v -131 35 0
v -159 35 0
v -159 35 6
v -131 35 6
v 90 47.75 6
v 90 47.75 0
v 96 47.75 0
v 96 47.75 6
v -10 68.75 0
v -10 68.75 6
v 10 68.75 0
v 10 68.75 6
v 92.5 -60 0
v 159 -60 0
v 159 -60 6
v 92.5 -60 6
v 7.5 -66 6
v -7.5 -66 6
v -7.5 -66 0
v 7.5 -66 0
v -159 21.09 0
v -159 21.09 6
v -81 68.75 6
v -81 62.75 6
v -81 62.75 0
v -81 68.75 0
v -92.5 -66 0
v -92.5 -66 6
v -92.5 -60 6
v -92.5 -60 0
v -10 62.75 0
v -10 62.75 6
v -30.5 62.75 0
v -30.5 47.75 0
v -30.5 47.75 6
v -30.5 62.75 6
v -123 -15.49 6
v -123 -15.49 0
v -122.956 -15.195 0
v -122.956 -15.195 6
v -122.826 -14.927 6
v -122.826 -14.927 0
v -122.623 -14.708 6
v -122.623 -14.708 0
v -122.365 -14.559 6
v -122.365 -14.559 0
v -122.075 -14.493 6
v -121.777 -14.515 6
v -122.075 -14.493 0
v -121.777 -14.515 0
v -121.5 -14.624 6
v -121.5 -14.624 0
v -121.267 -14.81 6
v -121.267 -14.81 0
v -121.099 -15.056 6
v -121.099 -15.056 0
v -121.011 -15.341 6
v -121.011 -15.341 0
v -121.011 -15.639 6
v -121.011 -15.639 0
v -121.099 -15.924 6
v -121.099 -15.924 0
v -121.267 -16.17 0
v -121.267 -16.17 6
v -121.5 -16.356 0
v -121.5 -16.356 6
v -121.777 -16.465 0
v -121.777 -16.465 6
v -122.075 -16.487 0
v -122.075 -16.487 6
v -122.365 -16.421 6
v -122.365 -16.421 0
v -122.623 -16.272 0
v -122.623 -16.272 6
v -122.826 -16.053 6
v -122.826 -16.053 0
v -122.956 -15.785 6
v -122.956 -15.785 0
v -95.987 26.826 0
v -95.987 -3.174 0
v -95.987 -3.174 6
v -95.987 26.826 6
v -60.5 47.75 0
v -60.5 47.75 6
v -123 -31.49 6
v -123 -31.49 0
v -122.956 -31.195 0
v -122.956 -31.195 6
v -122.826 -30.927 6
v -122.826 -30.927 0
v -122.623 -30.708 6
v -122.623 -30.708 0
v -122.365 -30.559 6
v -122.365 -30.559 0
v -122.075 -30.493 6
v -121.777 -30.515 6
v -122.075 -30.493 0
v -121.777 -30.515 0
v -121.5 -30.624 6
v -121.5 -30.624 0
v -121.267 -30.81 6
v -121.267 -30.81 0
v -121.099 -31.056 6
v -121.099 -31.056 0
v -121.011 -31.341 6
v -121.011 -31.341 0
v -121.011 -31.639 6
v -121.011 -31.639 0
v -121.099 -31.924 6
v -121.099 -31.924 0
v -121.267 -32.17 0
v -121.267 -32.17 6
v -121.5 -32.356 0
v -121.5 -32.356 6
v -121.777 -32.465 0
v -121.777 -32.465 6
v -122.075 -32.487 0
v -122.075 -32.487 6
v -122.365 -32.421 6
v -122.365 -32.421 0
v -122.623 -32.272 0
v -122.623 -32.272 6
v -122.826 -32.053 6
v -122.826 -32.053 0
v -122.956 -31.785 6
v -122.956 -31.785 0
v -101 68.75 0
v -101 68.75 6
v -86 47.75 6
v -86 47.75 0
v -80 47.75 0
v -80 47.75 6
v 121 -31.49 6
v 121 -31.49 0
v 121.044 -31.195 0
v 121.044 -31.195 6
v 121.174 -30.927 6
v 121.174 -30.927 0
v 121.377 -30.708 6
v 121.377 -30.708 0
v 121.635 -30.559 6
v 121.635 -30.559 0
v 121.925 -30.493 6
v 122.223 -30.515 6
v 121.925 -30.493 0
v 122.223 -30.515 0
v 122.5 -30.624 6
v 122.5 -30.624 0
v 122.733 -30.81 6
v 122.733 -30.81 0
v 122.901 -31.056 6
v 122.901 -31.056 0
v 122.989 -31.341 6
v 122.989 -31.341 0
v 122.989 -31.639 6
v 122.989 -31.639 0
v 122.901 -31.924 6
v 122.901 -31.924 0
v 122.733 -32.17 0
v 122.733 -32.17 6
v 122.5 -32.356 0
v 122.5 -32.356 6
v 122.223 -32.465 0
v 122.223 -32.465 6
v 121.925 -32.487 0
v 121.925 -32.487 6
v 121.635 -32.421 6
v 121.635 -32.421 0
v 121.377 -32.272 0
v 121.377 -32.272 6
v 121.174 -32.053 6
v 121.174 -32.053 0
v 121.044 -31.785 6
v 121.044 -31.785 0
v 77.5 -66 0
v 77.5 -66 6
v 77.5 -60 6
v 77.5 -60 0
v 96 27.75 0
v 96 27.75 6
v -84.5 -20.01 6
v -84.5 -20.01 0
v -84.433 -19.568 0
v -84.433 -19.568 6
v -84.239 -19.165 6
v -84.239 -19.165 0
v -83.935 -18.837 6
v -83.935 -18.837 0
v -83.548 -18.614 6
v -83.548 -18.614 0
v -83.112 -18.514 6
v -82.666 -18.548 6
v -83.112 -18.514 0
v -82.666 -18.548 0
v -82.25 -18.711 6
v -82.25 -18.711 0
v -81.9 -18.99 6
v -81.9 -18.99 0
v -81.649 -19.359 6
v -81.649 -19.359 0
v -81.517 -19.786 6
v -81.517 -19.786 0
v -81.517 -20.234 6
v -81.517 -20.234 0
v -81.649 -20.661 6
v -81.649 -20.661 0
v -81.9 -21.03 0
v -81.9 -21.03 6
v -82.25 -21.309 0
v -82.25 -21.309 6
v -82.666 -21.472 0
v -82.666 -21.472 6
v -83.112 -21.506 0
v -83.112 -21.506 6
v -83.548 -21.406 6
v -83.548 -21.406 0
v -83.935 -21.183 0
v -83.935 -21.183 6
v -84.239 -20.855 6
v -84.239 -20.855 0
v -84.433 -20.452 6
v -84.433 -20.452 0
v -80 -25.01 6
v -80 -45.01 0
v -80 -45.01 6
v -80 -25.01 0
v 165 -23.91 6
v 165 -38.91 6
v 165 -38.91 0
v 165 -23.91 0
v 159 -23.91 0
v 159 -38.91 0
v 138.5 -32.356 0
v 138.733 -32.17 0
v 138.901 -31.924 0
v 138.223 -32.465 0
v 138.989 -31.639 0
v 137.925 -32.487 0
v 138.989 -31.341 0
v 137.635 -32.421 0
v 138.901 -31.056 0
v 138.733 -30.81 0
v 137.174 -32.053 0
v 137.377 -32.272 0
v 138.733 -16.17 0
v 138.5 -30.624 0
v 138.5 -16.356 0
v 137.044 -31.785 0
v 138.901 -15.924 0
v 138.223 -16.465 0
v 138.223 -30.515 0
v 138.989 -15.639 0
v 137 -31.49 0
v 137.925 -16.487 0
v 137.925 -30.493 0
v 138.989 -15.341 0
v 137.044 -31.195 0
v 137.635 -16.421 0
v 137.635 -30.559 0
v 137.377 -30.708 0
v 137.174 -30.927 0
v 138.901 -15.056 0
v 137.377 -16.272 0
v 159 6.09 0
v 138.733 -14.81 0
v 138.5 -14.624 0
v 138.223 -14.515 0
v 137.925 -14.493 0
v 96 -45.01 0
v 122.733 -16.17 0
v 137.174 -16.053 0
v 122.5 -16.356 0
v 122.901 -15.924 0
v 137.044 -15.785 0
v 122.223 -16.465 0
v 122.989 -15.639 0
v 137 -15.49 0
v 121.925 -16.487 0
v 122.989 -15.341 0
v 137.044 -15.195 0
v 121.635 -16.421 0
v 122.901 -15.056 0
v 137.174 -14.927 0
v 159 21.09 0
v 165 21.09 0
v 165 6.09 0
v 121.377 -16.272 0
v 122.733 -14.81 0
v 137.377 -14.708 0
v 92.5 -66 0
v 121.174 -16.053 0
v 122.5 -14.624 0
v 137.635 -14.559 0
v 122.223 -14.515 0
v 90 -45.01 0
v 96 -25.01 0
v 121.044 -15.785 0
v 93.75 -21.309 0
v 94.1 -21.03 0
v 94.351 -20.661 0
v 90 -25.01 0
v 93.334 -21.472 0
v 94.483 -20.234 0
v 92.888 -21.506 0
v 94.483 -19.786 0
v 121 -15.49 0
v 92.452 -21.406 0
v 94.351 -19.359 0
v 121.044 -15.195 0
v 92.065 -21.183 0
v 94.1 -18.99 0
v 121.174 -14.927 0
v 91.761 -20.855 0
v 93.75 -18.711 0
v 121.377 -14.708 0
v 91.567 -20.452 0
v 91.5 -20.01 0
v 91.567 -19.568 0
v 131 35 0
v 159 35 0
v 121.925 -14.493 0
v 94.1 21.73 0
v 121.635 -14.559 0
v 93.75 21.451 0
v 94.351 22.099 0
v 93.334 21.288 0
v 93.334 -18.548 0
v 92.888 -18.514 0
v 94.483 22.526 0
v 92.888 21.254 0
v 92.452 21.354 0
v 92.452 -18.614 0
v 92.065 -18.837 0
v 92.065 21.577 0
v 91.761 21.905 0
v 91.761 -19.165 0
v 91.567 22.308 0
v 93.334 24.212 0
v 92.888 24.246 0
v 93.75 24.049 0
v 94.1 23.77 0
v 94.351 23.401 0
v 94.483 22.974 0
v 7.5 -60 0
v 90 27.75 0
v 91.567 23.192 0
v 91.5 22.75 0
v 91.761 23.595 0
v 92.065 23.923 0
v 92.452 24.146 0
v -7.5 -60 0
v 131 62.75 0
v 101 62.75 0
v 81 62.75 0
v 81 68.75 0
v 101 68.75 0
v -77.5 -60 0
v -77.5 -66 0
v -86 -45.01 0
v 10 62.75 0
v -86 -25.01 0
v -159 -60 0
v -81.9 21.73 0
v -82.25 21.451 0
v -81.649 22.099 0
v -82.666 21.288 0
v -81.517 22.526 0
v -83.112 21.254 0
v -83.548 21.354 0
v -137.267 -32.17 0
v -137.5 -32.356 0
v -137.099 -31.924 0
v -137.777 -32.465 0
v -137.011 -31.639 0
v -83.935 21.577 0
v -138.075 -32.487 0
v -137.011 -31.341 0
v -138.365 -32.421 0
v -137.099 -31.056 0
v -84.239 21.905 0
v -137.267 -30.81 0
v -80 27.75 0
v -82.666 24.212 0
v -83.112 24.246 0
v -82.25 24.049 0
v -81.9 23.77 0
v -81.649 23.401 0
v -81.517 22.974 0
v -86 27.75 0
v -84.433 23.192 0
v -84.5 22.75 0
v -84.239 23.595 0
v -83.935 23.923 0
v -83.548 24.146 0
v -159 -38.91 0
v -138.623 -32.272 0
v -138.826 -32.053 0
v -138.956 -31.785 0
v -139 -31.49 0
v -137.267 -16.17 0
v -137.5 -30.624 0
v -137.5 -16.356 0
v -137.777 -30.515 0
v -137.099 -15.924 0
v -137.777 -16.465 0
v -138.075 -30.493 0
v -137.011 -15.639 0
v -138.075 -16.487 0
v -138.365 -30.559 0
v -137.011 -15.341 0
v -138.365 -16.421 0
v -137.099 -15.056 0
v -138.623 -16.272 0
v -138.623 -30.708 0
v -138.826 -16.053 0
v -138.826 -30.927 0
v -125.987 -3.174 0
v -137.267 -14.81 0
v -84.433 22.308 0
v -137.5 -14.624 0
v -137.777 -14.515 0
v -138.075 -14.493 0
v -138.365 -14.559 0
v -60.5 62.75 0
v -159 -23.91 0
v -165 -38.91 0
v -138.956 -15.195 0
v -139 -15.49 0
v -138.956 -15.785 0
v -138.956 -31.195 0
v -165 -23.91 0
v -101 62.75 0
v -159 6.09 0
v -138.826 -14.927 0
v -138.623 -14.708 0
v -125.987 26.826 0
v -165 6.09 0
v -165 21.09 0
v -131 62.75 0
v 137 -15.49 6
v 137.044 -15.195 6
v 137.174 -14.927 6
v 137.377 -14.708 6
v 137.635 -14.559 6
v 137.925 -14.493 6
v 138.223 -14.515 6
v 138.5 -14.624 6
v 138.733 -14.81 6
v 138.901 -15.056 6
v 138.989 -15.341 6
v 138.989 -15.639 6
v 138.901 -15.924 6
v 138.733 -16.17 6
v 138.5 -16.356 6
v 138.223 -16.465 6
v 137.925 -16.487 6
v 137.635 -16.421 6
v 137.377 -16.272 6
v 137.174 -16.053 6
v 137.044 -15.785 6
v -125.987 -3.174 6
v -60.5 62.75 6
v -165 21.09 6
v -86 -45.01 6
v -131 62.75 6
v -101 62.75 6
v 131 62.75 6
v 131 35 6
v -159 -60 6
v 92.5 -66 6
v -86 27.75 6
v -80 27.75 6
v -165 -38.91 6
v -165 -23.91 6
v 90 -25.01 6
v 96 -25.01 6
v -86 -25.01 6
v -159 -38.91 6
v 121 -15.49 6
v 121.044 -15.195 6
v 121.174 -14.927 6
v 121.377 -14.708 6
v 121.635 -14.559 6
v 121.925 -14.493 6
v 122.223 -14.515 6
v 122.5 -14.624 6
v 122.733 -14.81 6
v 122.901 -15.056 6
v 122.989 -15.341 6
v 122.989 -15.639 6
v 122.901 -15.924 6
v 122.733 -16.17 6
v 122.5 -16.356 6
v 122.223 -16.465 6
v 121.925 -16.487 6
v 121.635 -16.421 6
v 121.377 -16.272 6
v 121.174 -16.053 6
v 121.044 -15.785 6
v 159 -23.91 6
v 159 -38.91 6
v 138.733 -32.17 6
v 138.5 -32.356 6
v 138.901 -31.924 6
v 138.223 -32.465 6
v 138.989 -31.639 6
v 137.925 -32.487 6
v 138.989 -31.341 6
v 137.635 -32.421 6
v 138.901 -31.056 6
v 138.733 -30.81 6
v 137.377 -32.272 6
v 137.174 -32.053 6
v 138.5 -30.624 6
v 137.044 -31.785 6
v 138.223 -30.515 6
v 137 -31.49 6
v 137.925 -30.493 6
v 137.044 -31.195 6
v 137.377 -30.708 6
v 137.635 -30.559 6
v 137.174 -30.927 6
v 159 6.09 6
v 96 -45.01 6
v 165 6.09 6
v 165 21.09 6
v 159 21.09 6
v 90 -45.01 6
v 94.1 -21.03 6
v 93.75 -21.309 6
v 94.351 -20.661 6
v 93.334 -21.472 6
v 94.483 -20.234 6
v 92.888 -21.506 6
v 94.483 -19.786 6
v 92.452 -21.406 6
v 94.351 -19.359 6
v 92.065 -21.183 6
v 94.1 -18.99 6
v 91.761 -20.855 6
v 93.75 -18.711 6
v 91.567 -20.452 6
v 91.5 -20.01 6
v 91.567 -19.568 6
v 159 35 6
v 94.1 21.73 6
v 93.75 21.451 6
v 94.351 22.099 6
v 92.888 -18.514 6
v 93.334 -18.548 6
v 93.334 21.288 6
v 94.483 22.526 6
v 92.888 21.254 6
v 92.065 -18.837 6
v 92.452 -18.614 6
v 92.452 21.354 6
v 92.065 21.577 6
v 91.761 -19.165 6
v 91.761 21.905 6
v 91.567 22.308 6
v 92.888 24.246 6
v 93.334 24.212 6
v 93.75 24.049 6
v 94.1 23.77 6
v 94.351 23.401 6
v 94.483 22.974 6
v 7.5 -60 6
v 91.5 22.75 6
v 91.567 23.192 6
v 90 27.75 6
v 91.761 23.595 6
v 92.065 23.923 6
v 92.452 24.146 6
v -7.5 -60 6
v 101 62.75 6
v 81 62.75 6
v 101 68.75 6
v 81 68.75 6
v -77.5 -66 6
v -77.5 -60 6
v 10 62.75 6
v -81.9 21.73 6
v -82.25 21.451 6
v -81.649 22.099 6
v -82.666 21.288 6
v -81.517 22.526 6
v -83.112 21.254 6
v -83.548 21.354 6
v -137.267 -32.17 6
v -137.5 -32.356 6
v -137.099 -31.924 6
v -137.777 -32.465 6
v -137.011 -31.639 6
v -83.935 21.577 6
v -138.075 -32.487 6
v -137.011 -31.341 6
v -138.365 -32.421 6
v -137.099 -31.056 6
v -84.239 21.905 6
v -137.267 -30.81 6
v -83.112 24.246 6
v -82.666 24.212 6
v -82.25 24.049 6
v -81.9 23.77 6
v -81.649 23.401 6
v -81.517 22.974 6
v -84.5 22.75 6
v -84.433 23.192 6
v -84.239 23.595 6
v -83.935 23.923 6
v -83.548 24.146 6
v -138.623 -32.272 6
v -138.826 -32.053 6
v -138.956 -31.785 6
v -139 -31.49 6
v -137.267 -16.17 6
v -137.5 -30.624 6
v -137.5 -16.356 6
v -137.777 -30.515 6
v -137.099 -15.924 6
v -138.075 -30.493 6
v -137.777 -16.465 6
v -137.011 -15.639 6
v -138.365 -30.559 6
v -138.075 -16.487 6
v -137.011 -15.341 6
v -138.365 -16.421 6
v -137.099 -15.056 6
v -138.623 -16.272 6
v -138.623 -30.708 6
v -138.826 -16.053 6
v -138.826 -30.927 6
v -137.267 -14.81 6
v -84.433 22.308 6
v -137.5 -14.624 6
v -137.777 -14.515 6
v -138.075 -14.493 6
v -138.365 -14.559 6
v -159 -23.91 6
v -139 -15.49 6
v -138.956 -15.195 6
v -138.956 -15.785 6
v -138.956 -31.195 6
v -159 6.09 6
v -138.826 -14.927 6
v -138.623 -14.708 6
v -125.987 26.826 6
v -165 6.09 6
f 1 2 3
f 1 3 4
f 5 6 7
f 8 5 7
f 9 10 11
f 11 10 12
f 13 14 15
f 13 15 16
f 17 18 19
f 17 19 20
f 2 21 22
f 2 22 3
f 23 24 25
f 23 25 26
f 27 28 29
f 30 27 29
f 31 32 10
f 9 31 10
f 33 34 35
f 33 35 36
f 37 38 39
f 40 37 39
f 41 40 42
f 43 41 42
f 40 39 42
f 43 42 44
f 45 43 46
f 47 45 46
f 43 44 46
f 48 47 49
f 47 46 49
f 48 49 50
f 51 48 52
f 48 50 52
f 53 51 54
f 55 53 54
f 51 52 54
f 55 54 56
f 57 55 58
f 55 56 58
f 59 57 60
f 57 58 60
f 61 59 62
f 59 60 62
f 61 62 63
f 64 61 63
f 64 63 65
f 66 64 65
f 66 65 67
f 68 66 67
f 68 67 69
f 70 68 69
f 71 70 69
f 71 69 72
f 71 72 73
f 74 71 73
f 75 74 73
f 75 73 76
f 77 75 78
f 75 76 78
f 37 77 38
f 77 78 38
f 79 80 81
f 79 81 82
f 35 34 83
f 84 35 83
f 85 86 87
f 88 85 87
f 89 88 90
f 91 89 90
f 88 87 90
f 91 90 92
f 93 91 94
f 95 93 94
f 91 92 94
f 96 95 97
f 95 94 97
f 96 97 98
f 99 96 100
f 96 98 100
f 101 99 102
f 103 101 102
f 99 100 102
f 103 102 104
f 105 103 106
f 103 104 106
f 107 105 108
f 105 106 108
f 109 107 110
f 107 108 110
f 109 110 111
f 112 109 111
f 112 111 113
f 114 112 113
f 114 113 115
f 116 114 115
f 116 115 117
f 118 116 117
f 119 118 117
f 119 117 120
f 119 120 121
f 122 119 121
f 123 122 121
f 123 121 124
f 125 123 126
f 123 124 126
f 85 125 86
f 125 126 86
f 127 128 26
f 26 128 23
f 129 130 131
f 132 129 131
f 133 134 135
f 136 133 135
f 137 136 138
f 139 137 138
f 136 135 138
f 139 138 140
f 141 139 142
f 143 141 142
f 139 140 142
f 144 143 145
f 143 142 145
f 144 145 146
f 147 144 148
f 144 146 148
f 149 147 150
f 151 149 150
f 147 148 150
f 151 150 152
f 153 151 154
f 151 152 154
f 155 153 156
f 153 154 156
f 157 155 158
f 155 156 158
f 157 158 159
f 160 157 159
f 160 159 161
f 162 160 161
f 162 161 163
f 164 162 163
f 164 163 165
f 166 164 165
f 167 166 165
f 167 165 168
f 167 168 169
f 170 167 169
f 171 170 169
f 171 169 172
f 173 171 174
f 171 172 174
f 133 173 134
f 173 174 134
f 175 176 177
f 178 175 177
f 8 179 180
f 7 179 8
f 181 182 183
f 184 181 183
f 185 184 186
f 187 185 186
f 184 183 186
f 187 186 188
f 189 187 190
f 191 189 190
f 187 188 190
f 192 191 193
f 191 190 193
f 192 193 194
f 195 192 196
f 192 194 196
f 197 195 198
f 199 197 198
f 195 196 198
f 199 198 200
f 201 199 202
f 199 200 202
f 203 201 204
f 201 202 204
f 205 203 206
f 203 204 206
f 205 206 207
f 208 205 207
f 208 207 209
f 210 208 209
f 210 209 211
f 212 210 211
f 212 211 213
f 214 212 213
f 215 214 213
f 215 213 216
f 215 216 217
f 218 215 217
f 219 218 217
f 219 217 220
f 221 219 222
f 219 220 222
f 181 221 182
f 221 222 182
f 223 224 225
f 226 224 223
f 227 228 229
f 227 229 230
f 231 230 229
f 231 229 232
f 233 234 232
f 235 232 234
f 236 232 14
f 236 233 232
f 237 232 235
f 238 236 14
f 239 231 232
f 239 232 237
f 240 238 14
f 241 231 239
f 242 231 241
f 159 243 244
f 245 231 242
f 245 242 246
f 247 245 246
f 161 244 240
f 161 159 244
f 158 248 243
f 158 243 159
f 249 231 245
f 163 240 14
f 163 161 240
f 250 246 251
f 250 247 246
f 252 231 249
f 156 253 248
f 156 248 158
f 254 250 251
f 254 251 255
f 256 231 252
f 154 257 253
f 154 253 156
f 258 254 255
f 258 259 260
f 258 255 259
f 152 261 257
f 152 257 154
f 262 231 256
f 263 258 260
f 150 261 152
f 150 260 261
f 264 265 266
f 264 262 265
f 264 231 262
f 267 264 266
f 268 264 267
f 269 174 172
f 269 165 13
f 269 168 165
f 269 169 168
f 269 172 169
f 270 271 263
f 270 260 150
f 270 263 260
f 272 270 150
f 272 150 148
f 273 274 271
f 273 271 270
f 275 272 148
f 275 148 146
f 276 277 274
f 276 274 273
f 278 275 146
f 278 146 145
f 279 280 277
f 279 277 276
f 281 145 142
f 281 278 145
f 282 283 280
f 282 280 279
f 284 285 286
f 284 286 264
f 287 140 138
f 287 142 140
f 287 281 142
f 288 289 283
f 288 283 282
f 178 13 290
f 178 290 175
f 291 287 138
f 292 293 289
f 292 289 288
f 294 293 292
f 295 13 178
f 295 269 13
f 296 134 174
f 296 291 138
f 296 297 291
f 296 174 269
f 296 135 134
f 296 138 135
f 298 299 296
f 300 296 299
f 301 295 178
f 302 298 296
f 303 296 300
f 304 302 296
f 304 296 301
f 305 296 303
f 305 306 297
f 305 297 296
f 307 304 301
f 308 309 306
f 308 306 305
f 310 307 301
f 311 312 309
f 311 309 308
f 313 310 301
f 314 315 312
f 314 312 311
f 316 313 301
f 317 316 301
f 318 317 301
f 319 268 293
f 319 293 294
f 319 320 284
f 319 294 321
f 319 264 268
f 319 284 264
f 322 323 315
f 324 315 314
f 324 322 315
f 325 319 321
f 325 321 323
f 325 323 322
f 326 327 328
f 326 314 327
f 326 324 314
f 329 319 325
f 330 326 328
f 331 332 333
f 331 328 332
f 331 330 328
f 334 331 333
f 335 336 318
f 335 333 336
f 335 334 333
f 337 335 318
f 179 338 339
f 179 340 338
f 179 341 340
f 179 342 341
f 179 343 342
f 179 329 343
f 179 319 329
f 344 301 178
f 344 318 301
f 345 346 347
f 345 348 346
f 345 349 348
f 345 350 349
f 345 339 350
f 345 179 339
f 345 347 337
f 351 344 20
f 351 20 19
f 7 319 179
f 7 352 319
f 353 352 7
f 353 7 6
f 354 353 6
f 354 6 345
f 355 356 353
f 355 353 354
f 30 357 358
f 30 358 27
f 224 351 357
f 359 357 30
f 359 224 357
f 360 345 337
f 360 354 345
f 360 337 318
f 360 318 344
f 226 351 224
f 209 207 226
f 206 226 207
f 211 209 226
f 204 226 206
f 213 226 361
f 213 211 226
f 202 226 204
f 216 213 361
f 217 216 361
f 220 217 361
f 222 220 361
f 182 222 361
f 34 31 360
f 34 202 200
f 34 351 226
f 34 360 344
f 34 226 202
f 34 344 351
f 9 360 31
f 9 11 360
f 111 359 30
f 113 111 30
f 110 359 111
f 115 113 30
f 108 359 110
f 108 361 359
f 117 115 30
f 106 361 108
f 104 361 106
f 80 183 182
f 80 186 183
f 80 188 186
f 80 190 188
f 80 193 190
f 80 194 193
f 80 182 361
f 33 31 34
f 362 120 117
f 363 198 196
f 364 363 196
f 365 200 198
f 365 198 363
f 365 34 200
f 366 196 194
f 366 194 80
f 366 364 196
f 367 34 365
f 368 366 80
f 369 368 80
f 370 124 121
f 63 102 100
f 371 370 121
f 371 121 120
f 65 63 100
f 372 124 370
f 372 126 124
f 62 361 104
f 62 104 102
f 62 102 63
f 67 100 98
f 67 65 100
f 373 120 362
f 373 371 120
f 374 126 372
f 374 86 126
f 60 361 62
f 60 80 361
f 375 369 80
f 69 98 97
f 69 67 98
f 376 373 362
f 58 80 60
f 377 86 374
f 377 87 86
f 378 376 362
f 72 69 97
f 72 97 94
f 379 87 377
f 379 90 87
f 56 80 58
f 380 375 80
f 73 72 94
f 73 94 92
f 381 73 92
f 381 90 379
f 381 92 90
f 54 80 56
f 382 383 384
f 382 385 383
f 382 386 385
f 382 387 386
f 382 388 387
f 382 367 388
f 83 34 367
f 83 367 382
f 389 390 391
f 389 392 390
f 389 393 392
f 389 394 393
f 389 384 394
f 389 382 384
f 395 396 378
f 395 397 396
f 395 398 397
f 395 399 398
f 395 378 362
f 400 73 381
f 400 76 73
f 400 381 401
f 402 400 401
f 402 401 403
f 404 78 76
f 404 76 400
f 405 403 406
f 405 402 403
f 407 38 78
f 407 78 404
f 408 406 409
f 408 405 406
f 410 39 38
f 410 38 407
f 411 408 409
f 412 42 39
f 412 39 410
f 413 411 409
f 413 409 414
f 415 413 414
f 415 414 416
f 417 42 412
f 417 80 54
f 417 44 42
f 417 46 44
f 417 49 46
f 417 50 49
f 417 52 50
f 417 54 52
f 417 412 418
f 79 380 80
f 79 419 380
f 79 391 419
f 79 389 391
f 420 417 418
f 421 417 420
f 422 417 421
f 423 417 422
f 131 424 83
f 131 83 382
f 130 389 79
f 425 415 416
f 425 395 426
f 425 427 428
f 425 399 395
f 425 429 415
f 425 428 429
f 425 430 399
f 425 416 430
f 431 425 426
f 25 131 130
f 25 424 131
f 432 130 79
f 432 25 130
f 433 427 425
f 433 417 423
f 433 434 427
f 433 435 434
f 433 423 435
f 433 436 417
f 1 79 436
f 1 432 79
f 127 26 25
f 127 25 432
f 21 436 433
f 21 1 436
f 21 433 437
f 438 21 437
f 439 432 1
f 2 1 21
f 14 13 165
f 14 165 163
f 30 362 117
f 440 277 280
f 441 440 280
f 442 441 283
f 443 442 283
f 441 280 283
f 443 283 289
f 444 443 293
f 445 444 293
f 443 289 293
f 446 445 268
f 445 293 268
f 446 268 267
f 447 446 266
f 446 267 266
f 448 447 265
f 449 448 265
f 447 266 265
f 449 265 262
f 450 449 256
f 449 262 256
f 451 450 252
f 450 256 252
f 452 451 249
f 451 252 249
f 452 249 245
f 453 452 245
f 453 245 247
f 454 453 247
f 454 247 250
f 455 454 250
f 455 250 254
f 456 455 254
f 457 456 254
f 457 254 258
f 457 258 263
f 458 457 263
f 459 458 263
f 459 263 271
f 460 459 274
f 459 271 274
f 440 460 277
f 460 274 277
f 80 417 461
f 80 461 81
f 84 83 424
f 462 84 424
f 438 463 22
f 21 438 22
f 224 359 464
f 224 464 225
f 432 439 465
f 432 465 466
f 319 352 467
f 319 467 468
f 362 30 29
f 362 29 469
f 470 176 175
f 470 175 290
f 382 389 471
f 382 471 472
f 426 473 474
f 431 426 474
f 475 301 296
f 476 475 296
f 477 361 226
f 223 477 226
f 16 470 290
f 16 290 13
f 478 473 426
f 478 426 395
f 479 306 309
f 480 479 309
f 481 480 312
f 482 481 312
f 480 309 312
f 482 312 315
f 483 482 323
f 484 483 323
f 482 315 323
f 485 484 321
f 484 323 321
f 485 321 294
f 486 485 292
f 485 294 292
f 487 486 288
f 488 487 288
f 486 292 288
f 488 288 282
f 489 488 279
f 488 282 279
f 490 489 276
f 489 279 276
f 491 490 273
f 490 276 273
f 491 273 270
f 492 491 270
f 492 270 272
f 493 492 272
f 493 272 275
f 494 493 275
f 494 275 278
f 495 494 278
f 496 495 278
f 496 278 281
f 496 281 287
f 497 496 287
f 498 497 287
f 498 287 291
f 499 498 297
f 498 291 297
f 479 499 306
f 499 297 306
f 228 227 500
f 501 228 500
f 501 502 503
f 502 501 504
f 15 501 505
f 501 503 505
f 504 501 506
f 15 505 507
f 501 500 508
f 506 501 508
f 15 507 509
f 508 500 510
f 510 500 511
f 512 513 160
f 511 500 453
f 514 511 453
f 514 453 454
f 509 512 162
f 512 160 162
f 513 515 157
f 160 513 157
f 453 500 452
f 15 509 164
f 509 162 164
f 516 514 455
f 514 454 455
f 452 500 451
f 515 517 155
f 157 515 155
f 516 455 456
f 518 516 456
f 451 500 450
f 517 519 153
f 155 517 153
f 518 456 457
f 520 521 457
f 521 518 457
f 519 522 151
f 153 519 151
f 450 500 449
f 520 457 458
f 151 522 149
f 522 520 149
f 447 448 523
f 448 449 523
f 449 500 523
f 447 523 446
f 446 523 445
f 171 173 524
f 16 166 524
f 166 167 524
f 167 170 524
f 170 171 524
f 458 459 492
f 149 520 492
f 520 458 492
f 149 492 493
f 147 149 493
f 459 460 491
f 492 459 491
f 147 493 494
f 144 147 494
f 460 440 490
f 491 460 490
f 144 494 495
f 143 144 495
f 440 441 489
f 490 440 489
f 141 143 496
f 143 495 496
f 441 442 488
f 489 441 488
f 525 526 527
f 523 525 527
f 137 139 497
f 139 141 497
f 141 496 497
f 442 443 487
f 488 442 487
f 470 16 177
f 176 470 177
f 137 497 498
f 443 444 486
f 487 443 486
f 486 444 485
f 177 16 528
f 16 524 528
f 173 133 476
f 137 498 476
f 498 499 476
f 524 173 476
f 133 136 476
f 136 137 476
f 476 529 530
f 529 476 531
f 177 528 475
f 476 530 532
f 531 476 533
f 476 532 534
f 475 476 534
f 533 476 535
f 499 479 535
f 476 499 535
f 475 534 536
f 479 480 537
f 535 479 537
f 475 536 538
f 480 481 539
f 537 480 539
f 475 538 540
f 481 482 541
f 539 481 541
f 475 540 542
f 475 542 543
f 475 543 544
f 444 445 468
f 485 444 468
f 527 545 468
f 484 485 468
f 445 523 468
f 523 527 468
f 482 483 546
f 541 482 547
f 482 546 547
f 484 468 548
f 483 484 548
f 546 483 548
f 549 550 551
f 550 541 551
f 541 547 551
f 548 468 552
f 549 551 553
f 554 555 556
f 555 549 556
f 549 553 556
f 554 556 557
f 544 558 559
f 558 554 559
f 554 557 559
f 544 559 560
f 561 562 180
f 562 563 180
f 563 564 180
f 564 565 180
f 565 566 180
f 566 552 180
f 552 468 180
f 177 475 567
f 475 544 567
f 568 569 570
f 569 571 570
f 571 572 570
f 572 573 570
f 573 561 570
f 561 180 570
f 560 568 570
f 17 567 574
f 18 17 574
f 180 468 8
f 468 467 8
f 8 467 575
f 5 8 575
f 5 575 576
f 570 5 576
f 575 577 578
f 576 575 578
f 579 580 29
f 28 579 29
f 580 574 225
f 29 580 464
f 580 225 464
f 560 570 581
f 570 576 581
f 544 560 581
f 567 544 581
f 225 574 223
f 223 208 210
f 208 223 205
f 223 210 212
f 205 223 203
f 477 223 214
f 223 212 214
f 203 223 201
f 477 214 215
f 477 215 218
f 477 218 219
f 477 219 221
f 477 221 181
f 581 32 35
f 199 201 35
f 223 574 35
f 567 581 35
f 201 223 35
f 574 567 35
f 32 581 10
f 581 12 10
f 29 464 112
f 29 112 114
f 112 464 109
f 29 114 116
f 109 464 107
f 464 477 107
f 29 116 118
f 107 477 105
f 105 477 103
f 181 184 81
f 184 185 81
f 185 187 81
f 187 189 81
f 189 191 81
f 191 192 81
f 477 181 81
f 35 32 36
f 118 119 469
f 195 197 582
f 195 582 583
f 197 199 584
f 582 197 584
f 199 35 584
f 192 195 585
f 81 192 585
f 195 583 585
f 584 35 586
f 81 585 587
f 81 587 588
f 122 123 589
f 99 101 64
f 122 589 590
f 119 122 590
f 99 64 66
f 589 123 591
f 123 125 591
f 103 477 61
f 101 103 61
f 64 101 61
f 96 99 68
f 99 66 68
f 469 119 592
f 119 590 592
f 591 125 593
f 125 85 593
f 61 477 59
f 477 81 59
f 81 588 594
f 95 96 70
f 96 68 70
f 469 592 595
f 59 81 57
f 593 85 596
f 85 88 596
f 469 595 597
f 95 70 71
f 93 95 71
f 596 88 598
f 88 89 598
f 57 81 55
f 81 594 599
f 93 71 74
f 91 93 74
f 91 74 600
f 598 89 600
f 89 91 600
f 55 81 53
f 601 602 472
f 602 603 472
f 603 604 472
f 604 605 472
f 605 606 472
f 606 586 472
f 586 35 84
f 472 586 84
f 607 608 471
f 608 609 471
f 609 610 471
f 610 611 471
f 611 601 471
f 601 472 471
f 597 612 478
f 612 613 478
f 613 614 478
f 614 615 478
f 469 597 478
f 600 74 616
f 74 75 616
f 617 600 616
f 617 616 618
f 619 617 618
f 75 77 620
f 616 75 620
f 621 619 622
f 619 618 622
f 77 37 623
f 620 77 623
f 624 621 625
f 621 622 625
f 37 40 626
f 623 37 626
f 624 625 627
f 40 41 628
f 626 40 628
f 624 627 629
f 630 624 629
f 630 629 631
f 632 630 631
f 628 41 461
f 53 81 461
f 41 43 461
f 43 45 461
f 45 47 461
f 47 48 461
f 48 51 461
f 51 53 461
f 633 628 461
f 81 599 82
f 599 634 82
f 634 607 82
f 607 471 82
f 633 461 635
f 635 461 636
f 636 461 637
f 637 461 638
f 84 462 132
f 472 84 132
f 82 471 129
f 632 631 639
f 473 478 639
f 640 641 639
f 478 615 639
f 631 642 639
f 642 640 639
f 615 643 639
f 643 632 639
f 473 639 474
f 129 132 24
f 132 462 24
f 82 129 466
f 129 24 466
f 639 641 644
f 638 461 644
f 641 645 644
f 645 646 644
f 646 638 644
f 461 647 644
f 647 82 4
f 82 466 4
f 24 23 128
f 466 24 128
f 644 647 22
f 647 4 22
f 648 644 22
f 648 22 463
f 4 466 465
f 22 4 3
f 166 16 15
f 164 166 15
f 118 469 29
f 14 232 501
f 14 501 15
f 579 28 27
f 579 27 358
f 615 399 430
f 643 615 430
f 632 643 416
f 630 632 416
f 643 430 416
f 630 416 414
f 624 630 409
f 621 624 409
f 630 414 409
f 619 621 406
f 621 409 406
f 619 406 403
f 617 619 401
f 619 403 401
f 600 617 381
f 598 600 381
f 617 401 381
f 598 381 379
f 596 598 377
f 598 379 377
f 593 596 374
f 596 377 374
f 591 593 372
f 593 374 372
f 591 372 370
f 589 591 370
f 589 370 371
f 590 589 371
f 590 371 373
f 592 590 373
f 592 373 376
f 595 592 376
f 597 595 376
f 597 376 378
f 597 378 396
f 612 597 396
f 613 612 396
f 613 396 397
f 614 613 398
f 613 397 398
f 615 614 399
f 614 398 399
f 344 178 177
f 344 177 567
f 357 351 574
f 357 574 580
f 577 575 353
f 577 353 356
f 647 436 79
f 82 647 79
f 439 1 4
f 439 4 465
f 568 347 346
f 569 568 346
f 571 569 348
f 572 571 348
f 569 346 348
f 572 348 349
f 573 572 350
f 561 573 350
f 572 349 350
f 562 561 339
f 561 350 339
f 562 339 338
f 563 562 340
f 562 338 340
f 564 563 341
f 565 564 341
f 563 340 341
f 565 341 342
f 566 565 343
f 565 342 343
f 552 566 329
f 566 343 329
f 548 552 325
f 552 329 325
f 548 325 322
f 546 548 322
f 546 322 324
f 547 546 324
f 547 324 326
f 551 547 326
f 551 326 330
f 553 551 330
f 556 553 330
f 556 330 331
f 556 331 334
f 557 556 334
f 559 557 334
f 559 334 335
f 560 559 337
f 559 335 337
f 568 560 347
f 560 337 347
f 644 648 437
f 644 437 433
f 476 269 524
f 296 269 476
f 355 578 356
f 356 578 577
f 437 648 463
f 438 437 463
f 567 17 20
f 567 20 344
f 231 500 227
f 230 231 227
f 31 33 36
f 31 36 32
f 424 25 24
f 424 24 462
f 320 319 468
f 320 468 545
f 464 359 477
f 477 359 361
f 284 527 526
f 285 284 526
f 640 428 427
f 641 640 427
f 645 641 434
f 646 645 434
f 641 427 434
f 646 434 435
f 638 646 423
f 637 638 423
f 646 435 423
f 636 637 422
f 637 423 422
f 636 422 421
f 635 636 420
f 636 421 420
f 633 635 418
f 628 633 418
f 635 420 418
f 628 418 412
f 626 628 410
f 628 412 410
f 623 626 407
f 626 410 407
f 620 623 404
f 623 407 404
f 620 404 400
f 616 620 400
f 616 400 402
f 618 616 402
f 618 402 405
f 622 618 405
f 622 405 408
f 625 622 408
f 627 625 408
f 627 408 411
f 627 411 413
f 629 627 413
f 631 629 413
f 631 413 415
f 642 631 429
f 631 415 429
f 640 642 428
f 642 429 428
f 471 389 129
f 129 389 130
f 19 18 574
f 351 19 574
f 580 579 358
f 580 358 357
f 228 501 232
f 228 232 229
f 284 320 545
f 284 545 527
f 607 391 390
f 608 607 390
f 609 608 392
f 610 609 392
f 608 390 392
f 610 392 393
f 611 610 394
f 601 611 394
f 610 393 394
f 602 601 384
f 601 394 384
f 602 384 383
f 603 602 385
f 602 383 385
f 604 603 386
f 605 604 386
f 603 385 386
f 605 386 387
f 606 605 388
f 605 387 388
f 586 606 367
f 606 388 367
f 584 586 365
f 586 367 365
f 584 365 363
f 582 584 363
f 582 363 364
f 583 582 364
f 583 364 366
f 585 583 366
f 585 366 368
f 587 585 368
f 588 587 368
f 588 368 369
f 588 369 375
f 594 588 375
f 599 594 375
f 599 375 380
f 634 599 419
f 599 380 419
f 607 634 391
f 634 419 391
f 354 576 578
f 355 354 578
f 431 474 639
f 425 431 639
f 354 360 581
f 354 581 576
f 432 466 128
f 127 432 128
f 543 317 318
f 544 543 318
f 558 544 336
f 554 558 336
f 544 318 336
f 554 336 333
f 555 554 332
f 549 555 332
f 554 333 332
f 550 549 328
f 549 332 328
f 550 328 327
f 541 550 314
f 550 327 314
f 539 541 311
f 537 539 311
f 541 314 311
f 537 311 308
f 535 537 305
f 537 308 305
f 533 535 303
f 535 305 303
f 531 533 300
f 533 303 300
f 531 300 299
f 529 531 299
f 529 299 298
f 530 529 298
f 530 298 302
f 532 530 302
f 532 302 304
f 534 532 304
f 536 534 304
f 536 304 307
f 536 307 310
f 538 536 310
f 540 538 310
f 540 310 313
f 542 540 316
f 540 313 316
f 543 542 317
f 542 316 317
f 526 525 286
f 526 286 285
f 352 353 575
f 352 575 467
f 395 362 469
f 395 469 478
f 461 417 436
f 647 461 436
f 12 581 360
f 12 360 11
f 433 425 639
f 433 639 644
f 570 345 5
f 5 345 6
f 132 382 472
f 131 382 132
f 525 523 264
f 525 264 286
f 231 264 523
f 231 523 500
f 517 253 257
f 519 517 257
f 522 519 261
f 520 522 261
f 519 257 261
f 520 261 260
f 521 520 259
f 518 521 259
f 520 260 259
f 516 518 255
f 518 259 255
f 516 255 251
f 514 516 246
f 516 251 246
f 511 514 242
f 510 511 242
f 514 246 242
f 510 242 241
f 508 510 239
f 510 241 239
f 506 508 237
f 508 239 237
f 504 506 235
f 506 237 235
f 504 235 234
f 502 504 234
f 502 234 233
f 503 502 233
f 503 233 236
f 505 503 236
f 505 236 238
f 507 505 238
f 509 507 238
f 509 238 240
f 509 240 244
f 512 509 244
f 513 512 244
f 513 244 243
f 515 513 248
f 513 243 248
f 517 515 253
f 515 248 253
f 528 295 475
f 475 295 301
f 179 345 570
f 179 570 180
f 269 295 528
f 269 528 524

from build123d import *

# Parameters (mm, degrees)
ESQUISSE1_W             = 6
ESQUISSE1_H             = 20
ESQUISSE1_W_2           = 30
ESQUISSE1_H_2           = 30
BOSS_EXTRU_1_DEPTH      = 6
ESQUISSE2_W             = 15
ESQUISSE2_H             = 6
ESQUISSE2_W_2           = 6
ESQUISSE2_H_2           = 15
ESQUISSE2_W_3           = 20
BOSS_EXTRU_2_DEPTH      = 6
ESQUISSE3_R             = 1
ESQUISSE3_R_2           = 1.5
ENL_V_MAT_EXTRU_1_DEPTH = 6
ESQUISSE4_W             = 30
ESQUISSE4_H             = 15
ENL_V_MAT_EXTRU_2_DEPTH = 6


with BuildPart() as part:
    # Esquisse1 → Boss.-Extru.1 (new body)
    with BuildSketch(Plane.XY):
        Polygon((-159, 35), (-131, 35), (-131, 62.75), (131, 62.75), (131, 35), (159, 35), (159, -60), (-159, -60), align=None)
        with Locations((93, 37.75)):
            Rectangle(ESQUISSE1_W, ESQUISSE1_H, mode=Mode.SUBTRACT)
        with Locations((93, -35.01)):
            Rectangle(ESQUISSE1_W, ESQUISSE1_H, mode=Mode.SUBTRACT)
        with Locations((-83, 37.75)):
            Rectangle(ESQUISSE1_W, ESQUISSE1_H, mode=Mode.SUBTRACT)
        with Locations((-83, -35.01)):
            Rectangle(ESQUISSE1_W, ESQUISSE1_H, mode=Mode.SUBTRACT)
        with Locations((-110.986534361, 11.825583908)):
            Rectangle(ESQUISSE1_W_2, ESQUISSE1_H_2, mode=Mode.SUBTRACT)
    extrude(amount=BOSS_EXTRU_1_DEPTH)

    # Esquisse2 → Boss.-Extru.2 (add)
    with BuildSketch(Plane.XY.offset(6)):
        with Locations((-85, -63)):
            Rectangle(ESQUISSE2_W, ESQUISSE2_H)
        with Locations((0, -63)):
            Rectangle(ESQUISSE2_W, ESQUISSE2_H)
        with Locations((85, -63)):
            Rectangle(ESQUISSE2_W, ESQUISSE2_H)
        with Locations((-162, 13.59)):
            Rectangle(ESQUISSE2_W_2, ESQUISSE2_H_2)
        with Locations((-162, -31.41)):
            Rectangle(ESQUISSE2_W_2, ESQUISSE2_H_2)
        with Locations((162, -31.41)):
            Rectangle(ESQUISSE2_W_2, ESQUISSE2_H_2)
        with Locations((162, 13.59)):
            Rectangle(ESQUISSE2_W_2, ESQUISSE2_H_2)
        with Locations((91, 65.75)):
            Rectangle(ESQUISSE2_W_3, ESQUISSE2_H)
        with Locations((-91, 65.75)):
            Rectangle(ESQUISSE2_W_3, ESQUISSE2_H)
        with Locations((0, 65.75)):
            Rectangle(ESQUISSE2_W_3, ESQUISSE2_H)
    extrude(amount=-BOSS_EXTRU_2_DEPTH)

    # Esquisse3 → Enlèv. mat.-Extru.1 (cut)
    with BuildSketch(Plane(origin=(0, 0, 0), x_dir=(-1, 0, 0), z_dir=(0, 0, -1))):
        with Locations((138, -31.49)):
            Circle(ESQUISSE3_R)
        with Locations((138, -15.49)):
            Circle(ESQUISSE3_R)
        with Locations((122, -15.49)):
            Circle(ESQUISSE3_R)
        with Locations((122, -31.49)):
            Circle(ESQUISSE3_R)
        with Locations((-122, -31.49)):
            Circle(ESQUISSE3_R)
        with Locations((-122, -15.49)):
            Circle(ESQUISSE3_R)
        with Locations((-138, -15.49)):
            Circle(ESQUISSE3_R)
        with Locations((-138, -31.49)):
            Circle(ESQUISSE3_R)
        with Locations((83, 22.75)):
            Circle(ESQUISSE3_R_2)
        with Locations((83, -20.01)):
            Circle(ESQUISSE3_R_2)
        with Locations((-93, 22.75)):
            Circle(ESQUISSE3_R_2)
        with Locations((-93, -20.01)):
            Circle(ESQUISSE3_R_2)
    extrude(amount=-ENL_V_MAT_EXTRU_1_DEPTH, mode=Mode.SUBTRACT)

    # Esquisse4 → Enlèv. mat.-Extru.2 (cut)
    with BuildSketch(Plane(origin=(0, 0, 0), x_dir=(-1, 0, 0), z_dir=(0, 0, -1))):
        with Locations((45.5, 55.25)):
            Rectangle(ESQUISSE4_W, ESQUISSE4_H)
    extrude(amount=-ENL_V_MAT_EXTRU_2_DEPTH, mode=Mode.SUBTRACT)


solid = part.part
